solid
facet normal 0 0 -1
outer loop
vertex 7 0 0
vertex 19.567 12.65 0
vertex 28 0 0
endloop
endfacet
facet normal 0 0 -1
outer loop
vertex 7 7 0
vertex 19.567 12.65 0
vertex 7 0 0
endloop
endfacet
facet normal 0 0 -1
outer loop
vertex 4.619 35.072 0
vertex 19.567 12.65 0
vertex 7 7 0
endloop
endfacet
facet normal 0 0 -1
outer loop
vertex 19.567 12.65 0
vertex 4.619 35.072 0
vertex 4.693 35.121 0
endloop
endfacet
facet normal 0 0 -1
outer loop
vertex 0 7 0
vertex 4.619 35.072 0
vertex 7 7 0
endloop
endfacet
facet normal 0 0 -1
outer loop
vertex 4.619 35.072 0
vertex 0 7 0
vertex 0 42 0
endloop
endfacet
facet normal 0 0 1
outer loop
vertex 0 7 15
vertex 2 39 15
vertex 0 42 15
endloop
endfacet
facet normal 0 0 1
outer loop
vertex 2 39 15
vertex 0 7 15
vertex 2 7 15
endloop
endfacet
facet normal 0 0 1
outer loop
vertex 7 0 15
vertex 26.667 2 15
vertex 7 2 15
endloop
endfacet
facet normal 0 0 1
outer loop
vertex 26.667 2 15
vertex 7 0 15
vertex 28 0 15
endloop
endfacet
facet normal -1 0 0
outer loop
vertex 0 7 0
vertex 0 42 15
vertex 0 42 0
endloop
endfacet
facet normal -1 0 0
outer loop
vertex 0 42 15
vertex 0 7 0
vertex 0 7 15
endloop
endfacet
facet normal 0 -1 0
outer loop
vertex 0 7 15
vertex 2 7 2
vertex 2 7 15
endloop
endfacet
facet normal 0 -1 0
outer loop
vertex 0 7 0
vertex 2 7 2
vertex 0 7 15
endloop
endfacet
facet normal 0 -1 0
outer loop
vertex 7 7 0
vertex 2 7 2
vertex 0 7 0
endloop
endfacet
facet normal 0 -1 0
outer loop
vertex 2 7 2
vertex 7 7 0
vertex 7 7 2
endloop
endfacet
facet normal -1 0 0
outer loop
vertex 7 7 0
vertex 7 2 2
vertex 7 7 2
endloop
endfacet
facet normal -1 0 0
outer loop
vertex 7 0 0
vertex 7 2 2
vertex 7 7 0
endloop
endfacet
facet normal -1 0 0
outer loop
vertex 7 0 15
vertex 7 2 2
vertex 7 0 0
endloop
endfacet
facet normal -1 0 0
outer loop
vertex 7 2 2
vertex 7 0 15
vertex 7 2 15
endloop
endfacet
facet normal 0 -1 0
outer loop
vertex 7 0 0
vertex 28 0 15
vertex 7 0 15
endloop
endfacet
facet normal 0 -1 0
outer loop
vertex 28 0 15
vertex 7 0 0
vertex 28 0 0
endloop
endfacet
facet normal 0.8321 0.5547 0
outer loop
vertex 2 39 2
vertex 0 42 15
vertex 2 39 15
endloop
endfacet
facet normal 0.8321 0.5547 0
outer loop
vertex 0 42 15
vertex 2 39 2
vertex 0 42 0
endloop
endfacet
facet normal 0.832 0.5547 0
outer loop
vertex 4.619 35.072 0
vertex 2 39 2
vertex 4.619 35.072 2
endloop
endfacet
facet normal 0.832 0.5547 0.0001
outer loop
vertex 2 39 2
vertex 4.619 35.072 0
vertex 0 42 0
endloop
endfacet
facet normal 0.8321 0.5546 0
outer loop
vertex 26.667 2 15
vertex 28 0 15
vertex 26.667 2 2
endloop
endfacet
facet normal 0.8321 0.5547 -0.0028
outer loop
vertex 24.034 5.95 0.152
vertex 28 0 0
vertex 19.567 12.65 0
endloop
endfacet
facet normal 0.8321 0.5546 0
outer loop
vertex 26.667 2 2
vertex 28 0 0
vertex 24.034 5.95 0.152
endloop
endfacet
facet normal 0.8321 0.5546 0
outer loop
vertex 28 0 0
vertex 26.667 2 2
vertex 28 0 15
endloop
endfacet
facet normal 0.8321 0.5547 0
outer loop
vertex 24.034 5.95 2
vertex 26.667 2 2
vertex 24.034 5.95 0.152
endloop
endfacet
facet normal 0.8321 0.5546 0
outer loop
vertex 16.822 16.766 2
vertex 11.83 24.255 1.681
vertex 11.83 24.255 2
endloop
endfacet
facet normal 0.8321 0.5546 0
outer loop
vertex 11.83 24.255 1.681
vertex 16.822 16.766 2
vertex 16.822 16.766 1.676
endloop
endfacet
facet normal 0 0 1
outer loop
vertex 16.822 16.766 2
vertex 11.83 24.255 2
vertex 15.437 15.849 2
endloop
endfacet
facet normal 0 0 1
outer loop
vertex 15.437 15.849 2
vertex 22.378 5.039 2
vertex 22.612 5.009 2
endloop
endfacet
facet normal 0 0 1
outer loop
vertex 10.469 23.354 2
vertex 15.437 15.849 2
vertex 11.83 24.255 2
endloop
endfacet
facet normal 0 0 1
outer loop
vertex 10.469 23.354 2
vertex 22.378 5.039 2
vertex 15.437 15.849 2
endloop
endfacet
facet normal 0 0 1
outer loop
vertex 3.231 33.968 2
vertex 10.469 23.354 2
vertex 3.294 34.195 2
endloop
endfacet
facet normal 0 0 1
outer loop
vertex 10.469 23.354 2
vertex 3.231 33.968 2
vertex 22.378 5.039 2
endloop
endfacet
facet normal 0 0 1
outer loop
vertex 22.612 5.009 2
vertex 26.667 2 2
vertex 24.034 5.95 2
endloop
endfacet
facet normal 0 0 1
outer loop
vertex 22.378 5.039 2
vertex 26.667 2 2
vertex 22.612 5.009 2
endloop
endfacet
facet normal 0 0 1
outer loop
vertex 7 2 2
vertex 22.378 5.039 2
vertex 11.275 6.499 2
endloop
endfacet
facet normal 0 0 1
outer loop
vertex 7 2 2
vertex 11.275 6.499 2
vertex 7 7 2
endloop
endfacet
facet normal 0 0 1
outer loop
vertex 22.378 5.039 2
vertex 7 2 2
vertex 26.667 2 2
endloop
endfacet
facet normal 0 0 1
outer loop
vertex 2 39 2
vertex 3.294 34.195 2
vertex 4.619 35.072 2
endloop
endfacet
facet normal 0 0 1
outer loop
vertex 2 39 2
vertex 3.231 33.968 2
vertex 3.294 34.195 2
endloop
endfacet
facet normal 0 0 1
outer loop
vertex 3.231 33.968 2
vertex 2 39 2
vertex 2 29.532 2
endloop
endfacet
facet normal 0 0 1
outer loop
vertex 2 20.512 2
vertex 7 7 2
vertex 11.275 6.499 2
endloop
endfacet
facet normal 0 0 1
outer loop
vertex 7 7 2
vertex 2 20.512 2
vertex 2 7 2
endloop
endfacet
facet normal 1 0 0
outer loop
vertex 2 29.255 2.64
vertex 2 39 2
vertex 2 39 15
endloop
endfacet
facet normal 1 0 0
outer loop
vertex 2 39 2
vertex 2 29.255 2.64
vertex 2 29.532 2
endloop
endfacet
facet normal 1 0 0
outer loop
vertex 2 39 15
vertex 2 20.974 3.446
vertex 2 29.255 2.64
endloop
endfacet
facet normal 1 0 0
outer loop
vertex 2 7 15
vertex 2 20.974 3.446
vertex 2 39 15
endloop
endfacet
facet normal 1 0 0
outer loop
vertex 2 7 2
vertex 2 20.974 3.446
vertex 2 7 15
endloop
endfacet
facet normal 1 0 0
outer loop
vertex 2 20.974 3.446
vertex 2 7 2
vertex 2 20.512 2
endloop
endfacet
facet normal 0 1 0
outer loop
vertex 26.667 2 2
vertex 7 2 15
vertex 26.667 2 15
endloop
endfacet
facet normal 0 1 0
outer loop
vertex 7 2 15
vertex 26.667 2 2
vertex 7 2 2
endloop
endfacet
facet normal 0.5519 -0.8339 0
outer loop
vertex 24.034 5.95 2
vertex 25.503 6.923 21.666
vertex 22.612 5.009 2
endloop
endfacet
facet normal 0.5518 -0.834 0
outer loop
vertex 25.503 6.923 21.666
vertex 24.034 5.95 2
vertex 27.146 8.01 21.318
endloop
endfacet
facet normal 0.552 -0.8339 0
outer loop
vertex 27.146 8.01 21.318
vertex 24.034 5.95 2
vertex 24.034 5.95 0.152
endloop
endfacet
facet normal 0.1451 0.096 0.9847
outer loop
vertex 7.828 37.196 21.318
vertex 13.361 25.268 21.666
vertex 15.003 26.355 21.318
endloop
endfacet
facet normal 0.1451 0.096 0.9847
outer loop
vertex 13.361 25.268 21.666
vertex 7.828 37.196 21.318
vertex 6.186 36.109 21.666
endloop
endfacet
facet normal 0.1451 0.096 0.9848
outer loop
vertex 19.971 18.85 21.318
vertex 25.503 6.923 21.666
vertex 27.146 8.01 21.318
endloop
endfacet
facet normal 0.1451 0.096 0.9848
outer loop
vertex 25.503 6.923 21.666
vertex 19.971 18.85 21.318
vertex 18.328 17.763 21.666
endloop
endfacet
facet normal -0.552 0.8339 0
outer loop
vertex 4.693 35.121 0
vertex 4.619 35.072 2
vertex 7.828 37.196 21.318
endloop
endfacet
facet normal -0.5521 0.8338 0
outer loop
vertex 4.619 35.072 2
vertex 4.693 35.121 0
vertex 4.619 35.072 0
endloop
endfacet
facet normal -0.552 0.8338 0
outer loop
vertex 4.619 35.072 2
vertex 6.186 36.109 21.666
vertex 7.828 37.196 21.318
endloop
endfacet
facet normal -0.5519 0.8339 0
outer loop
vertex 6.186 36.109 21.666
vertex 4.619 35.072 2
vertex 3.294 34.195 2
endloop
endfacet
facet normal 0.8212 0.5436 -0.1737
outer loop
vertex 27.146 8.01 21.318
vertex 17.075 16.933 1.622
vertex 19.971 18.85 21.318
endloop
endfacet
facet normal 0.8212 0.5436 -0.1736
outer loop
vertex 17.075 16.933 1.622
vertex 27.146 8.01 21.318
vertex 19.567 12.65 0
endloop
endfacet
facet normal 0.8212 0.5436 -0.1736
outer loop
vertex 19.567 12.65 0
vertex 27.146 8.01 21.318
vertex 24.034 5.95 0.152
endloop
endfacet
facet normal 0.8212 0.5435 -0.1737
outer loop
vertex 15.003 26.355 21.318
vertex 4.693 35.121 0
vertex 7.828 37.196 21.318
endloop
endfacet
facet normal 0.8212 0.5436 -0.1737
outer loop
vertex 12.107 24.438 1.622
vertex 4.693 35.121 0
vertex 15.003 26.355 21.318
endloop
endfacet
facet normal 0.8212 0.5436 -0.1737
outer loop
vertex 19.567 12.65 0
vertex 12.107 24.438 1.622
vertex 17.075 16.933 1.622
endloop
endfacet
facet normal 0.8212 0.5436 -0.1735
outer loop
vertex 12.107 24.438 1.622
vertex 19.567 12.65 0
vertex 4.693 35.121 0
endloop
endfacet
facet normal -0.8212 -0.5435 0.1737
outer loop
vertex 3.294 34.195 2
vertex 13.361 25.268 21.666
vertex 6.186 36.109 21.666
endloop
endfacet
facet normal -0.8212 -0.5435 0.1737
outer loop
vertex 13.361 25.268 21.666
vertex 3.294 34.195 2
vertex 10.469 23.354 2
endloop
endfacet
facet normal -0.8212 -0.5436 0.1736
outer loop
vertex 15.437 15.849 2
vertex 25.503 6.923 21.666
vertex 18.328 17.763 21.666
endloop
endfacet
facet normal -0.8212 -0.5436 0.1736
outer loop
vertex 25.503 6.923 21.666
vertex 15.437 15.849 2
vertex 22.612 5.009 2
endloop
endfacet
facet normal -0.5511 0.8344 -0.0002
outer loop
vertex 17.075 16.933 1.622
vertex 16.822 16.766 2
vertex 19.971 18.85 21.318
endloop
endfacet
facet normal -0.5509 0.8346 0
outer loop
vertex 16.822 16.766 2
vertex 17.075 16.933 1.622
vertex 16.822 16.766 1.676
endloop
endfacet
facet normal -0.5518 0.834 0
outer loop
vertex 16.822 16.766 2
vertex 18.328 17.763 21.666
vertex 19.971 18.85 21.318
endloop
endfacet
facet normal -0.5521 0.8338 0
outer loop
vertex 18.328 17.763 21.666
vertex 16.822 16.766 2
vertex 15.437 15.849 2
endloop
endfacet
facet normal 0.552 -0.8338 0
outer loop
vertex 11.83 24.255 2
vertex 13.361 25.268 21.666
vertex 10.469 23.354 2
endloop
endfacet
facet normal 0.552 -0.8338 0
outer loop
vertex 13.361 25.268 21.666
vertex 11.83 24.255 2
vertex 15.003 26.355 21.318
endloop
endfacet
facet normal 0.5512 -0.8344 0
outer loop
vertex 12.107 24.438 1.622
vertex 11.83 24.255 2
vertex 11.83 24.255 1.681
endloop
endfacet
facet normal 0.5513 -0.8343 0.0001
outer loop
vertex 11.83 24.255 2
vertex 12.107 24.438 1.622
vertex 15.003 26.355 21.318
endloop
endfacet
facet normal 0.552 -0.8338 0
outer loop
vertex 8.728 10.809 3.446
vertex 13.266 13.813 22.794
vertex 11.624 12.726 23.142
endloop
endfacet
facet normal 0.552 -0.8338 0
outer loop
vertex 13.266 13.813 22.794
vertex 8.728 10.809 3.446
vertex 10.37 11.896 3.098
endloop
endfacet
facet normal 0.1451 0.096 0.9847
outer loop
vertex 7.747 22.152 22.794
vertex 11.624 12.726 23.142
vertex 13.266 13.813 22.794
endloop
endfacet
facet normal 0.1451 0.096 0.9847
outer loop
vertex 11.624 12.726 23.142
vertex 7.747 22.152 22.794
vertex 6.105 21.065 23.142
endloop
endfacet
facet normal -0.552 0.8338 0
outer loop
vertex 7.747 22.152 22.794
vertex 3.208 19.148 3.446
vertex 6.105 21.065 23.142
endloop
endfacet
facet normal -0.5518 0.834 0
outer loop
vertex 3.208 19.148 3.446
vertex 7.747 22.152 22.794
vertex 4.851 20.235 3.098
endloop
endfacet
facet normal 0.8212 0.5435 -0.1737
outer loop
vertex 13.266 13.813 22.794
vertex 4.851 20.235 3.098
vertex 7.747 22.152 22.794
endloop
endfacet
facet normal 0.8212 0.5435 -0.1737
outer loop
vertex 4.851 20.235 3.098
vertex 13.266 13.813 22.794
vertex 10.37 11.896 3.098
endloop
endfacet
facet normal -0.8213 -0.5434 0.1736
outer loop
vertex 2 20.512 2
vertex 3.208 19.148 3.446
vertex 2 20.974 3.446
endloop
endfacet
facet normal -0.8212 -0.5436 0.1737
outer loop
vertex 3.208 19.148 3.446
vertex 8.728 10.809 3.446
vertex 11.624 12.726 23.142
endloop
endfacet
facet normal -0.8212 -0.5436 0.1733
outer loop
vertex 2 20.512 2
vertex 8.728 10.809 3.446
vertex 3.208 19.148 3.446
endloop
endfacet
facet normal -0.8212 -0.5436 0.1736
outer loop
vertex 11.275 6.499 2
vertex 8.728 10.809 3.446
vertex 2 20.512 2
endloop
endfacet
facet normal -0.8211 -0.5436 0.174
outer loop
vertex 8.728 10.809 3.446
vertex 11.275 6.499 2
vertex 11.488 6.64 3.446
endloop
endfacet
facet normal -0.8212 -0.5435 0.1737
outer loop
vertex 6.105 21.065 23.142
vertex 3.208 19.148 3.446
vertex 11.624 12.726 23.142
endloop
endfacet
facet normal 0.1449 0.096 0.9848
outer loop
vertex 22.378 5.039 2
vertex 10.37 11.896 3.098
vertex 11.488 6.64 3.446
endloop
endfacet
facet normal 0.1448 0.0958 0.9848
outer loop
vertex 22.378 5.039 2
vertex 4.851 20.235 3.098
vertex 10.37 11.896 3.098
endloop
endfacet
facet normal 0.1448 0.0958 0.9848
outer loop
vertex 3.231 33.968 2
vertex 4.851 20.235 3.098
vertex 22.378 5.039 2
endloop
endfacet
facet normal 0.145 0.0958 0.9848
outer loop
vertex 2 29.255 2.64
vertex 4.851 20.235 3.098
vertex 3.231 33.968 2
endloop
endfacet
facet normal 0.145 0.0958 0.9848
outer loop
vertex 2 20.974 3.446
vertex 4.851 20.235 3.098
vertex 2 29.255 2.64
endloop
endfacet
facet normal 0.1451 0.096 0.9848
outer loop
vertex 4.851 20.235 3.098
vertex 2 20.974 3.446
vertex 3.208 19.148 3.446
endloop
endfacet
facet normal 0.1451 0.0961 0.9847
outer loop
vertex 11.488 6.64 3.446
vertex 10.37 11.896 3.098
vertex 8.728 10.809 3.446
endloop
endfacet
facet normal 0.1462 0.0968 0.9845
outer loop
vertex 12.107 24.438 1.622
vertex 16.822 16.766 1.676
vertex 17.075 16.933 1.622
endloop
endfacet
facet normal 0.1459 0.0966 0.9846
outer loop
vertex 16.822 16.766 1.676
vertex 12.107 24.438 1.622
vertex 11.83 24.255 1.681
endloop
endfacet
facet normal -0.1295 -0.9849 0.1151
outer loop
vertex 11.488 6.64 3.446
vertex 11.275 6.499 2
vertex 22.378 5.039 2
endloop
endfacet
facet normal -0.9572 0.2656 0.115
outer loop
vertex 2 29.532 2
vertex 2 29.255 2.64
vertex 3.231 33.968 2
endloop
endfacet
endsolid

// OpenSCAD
difference() {
   union() {
      frame();
      surround();
   }

   translate([-1,-1,-2]) cube([50,50,2]);
}

module surround() {
   translate([3,34,0]) rotate([0,0,-56.5]) rotate([-10,0,0]) {
      /* front */
      difference() {
         cube([35,2,22]);
         translate([(35-9)/2,-0.25,-0.25]) cube([9,2.5,23]);
      }

      /* back */
      translate([(35-20)/2+5,-8.5,0]) cube([10,2,22]);
   
      /* surroundBase */
      surroundBase();
   }
}

module surroundBase() {
   linear_extrude(height=2) polygon(points=[[0,0], [0,2], [35,2], [35,0], 
                                            [27.5,-8.5], [7.5,-8.5]]);
}

module frame() {
   /* bottom */
   linear_extrude(height=2) bottomPoly();

   /* back sides */
   difference() {
      linear_extrude(height=15) bottomPoly();
      translate([2,2,2]) cube([50,50,20]);
   }
}

module bottomPoly() {
   polygon(points=[[7,7],[0,7],[0,42],[28,0],[7,0]]);
}
